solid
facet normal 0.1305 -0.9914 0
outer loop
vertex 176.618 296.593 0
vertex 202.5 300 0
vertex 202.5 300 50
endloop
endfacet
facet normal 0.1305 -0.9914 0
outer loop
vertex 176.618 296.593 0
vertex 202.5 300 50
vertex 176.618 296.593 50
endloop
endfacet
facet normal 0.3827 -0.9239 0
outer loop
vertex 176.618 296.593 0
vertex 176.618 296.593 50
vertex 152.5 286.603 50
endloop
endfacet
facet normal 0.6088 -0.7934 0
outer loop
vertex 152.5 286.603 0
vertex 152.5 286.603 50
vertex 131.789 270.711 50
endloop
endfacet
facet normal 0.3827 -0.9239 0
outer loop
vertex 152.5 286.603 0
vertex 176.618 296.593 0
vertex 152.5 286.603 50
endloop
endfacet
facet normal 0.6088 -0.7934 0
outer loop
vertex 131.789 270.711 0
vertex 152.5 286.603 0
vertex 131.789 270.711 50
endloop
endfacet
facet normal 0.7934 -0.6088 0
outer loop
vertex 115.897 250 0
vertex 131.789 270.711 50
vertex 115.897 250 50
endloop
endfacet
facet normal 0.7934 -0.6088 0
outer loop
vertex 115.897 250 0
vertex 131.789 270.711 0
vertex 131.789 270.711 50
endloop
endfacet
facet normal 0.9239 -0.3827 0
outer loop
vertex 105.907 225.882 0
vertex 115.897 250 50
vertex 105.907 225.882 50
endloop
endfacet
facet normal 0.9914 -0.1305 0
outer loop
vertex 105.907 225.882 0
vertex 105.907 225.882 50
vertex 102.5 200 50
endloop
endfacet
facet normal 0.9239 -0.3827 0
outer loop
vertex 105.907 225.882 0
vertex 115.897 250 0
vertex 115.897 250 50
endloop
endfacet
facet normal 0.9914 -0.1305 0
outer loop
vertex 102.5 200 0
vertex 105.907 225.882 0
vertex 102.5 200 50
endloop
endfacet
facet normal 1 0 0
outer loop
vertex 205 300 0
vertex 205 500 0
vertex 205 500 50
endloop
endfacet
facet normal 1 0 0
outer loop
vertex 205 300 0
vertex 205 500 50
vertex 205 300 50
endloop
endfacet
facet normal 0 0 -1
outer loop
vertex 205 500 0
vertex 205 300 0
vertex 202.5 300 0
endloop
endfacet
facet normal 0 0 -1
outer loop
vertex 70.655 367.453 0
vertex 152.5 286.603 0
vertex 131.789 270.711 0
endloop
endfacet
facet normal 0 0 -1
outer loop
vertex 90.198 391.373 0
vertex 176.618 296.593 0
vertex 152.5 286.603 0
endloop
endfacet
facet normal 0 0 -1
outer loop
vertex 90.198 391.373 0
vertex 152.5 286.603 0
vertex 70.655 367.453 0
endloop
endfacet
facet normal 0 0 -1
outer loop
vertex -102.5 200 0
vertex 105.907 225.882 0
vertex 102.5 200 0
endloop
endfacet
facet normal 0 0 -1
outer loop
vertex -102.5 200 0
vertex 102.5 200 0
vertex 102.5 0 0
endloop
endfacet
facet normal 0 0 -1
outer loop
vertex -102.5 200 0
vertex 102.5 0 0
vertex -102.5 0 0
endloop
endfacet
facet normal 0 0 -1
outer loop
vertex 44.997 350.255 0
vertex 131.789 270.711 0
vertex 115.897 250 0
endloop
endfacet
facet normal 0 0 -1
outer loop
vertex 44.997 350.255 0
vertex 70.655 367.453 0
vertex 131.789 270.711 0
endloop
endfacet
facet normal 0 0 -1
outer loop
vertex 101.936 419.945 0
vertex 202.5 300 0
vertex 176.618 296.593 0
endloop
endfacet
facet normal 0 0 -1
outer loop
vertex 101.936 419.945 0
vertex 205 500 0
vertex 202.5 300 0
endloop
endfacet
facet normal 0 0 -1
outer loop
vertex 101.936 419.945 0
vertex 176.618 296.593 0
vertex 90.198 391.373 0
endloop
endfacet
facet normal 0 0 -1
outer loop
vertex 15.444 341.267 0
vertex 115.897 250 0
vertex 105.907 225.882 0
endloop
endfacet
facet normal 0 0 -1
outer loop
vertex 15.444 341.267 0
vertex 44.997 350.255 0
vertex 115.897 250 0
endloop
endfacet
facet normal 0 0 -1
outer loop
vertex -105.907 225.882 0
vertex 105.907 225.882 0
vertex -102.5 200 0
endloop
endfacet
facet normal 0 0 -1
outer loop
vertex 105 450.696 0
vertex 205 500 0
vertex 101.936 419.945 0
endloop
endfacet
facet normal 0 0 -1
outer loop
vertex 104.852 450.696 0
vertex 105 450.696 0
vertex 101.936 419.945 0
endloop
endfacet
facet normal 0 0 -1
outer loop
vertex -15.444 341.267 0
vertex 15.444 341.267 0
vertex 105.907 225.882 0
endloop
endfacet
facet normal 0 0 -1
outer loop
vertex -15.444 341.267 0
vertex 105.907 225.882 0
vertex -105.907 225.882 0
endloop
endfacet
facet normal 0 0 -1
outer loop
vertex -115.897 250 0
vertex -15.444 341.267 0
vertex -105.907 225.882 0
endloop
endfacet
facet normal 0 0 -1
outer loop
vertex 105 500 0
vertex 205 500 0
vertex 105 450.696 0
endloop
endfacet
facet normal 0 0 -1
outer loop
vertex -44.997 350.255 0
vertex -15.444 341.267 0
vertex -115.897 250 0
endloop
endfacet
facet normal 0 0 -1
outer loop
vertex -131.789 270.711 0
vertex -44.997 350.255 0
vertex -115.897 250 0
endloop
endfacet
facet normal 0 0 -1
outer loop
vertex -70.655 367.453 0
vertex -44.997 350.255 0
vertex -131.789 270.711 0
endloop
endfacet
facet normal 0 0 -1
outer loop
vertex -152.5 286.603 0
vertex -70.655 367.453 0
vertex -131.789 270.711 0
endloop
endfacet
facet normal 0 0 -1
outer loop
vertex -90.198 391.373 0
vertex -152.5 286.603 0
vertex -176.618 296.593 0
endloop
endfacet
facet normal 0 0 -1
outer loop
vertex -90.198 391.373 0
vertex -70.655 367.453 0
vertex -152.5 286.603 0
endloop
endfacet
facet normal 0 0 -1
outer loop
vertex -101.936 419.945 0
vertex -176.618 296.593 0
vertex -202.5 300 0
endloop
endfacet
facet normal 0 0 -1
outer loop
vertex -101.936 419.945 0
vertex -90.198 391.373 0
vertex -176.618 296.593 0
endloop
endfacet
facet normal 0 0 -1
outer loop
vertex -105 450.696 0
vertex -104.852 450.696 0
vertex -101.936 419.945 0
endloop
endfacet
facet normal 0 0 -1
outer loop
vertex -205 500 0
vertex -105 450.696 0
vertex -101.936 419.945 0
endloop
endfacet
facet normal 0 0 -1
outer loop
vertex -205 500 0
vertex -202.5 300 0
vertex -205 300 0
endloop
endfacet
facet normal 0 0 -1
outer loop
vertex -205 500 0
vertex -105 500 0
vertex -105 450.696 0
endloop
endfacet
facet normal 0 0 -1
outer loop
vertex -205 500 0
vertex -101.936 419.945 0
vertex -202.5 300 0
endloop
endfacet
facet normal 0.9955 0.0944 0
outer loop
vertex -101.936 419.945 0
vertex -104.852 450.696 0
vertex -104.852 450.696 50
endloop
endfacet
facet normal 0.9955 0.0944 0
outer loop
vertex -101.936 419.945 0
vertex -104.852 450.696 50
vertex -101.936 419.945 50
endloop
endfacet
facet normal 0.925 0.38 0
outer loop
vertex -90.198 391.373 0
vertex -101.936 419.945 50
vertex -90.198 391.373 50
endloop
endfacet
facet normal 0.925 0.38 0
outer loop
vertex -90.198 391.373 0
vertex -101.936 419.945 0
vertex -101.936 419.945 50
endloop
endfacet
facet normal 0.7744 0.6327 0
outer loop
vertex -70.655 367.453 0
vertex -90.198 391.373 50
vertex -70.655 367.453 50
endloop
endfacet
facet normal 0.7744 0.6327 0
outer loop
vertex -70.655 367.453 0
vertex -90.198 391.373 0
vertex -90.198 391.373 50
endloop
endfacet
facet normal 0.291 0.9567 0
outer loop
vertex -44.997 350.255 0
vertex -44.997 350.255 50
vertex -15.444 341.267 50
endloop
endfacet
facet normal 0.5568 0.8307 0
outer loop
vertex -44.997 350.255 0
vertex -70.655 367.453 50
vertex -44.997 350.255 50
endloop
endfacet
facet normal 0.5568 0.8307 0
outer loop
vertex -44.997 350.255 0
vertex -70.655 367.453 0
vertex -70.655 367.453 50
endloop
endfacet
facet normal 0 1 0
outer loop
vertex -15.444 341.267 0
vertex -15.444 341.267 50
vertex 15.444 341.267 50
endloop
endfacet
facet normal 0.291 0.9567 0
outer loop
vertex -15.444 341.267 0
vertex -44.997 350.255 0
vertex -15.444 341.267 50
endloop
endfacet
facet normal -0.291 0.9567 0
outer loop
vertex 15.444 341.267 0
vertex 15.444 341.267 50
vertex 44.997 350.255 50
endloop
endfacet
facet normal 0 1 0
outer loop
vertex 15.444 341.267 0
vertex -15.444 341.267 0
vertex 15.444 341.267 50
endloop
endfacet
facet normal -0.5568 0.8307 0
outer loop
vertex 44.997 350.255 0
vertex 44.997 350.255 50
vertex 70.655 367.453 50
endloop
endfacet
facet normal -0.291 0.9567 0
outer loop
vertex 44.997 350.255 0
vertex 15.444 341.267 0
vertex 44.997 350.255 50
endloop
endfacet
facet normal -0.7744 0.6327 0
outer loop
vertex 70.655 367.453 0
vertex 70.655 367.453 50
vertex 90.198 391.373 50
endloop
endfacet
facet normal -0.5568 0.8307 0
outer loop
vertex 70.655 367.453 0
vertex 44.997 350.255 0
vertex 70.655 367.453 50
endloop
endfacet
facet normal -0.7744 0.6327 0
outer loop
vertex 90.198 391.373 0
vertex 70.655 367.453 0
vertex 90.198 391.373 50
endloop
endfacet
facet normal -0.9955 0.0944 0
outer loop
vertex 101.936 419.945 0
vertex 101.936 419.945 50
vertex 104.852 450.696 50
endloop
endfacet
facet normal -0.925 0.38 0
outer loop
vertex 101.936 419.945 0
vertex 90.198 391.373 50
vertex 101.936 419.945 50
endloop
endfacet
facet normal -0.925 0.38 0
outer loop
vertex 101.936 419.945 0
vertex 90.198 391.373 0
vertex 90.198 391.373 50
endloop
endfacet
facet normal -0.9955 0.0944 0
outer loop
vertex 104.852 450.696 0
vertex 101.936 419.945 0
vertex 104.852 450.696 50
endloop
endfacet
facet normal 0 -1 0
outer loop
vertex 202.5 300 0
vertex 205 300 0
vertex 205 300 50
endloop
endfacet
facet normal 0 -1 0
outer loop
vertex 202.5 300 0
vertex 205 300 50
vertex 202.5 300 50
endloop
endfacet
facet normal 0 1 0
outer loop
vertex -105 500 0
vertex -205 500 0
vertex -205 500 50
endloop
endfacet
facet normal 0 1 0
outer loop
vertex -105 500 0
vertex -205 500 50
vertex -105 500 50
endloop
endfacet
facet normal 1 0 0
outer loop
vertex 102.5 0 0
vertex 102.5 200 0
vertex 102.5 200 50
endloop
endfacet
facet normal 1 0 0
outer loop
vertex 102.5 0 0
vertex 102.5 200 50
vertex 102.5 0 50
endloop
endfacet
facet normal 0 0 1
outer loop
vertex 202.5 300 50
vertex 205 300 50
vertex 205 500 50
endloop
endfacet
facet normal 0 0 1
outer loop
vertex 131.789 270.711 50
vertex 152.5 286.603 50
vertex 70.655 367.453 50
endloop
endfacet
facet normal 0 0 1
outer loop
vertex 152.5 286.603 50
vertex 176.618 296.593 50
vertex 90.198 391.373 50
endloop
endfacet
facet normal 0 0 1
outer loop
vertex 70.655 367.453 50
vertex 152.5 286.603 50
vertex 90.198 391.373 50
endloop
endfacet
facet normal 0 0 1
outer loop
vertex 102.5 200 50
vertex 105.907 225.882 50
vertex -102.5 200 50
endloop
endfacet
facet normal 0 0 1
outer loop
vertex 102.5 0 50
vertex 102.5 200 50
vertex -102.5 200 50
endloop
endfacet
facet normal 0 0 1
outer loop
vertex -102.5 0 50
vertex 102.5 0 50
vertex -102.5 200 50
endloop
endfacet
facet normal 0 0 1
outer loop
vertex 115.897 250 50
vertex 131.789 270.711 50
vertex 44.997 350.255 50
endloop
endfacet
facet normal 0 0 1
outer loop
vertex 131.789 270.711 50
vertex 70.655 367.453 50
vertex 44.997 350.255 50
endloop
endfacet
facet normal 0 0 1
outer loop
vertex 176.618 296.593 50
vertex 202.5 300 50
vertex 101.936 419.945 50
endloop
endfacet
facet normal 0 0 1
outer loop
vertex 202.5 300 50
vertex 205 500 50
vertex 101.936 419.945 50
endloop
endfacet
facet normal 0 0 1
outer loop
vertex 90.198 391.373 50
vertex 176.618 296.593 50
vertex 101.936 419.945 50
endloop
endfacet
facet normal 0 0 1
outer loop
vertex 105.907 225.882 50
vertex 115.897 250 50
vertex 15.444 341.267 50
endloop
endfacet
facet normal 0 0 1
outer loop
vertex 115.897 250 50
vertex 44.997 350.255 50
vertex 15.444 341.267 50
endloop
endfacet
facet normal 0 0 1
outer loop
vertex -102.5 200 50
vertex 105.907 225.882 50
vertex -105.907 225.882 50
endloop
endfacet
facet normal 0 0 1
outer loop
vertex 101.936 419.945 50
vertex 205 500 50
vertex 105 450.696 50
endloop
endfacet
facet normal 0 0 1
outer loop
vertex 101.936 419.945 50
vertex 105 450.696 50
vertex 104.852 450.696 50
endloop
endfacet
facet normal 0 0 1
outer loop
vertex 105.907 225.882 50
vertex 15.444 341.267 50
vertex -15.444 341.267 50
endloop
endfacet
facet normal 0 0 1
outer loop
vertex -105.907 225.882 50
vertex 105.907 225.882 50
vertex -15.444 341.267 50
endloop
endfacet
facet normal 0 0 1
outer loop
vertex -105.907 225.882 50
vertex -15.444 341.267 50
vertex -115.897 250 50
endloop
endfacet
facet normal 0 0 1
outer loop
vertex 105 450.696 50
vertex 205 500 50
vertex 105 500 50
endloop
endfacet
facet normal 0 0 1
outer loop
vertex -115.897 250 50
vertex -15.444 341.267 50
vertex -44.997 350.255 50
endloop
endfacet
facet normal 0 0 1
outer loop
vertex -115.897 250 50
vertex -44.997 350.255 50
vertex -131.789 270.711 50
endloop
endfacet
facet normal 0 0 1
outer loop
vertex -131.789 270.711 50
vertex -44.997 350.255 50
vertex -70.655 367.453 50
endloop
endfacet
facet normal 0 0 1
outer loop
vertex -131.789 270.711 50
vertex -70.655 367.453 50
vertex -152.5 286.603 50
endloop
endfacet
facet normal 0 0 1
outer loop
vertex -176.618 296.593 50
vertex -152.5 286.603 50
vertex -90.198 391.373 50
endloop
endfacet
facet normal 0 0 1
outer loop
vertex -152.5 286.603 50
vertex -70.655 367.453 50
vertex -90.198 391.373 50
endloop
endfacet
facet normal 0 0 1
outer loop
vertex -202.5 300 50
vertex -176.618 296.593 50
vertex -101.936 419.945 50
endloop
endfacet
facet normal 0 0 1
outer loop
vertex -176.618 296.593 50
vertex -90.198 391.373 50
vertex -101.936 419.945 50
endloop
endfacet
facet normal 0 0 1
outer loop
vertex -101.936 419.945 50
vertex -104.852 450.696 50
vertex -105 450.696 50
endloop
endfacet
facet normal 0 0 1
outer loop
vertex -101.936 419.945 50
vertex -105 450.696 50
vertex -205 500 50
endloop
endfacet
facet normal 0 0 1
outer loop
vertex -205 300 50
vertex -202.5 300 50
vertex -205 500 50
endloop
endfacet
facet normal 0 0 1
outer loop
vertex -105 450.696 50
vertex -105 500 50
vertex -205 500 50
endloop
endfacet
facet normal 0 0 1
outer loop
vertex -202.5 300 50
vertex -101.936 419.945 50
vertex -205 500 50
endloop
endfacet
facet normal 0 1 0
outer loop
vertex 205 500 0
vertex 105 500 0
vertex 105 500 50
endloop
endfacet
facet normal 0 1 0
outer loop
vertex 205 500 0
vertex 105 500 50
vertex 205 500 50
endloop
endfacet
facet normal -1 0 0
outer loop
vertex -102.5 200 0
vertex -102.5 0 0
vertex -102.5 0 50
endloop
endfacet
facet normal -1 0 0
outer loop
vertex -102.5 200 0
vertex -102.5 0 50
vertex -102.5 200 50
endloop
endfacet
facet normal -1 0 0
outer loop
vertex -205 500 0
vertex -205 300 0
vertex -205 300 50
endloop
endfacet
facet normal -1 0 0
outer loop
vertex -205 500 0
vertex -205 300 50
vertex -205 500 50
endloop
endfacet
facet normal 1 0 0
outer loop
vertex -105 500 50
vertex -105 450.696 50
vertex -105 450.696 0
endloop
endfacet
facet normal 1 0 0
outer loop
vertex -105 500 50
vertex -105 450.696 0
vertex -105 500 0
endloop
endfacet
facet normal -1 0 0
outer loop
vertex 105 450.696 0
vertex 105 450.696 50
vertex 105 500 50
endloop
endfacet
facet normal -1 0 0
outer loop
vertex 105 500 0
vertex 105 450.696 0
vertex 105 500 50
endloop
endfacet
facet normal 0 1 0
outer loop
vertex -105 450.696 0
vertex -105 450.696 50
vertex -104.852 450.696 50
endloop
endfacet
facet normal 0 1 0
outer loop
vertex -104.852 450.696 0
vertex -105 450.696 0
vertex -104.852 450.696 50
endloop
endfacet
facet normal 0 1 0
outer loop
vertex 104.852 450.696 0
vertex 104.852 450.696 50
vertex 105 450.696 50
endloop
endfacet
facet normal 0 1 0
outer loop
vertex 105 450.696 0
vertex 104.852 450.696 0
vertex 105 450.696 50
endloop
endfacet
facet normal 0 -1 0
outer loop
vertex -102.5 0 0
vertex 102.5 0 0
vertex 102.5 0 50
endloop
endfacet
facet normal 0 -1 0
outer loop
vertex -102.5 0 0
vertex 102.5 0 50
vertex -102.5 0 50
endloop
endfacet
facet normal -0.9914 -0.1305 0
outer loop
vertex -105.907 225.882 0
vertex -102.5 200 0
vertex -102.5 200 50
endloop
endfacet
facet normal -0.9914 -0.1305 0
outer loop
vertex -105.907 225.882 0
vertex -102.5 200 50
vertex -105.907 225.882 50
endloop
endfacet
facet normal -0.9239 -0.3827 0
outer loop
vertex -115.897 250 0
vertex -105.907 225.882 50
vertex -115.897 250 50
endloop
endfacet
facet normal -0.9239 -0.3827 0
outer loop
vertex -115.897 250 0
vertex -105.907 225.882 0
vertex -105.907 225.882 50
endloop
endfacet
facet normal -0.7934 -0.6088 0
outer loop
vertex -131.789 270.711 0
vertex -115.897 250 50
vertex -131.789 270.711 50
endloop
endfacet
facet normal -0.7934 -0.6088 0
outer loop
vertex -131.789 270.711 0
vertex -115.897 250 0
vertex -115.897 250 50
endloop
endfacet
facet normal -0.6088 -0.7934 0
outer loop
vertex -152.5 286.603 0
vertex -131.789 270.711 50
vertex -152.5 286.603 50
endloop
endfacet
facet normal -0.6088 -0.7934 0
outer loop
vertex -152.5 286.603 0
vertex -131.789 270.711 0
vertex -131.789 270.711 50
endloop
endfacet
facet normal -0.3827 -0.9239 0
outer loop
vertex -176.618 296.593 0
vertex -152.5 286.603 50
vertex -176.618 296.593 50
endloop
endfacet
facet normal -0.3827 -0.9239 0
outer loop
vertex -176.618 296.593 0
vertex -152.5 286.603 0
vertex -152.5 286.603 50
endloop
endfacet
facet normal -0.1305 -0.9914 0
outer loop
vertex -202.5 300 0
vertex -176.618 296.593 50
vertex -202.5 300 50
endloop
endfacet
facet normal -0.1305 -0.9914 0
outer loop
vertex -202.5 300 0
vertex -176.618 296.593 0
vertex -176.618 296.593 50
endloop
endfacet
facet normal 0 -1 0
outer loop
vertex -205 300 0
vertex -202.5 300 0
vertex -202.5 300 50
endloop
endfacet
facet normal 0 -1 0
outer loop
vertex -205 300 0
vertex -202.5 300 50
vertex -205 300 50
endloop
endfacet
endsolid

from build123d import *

# Parameters (mm, degrees)
BOSS_EXTRUDE2_DEPTH = 50
CUT_EXTRUDE2_START  = -102.5
SKETCH2_R           = 3.05
CUT_EXTRUDE2_DEPTH  = 6
CUT_EXTRUDE3_START  = 96.5
SKETCH2_2_R         = 3.05
CUT_EXTRUDE3_DEPTH  = 6
BOSS_EXTRUDE3_DEPTH = 50
SKETCH5_R           = 105
CUT_EXTRUDE6_DEPTH  = 543.701575454
SKETCH8_W           = 210
SKETCH8_H           = 49.303912119
CUT_EXTRUDE7_DEPTH  = 543.701575454


with BuildPart() as part:
    # Sketch1 → Boss-Extrude2 (new body)
    with BuildSketch(Plane.XY):
        with BuildLine():
            Line((102.5, 0), (-102.5, 0))
            Line((-102.5, 0), (-102.5, 200))
            ThreePointArc((-102.5, 200), (-131.789321881, 270.710678119), (-202.5, 300))
            Line((-202.5, 300), (-205, 300))
            Line((-205, 300), (-205, 490))
            ThreePointArc((-205, 490), (-202.071067812, 497.071067812), (-195, 500))
            Line((-195, 500), (-112.5, 500))
            ThreePointArc((-112.5, 500), (-105.428932188, 497.071067812), (-102.5, 490))
            Line((-102.5, 490), (-102.5, 400.25))
            ThreePointArc((-102.5, 400.25), (-102.426776695, 400.073223305), (-102.25, 400))
            Line((-102.25, 400), (102.25, 400))
            ThreePointArc((102.25, 400), (102.426776695, 400.073223305), (102.5, 400.25))
            Line((102.5, 400.25), (102.5, 490))
            ThreePointArc((102.5, 490), (105.428932188, 497.071067812), (112.5, 500))
            Line((112.5, 500), (195, 500))
            ThreePointArc((195, 500), (202.071067812, 497.071067812), (205, 490))
            Line((205, 490), (205, 300))
            Line((205, 300), (202.5, 300))
            ThreePointArc((202.5, 300), (131.789321881, 270.710678119), (102.5, 200))
            Line((102.5, 200), (102.5, 0))
        make_face()
    extrude(amount=BOSS_EXTRUDE2_DEPTH)

    # Sketch2 → Cut-Extrude2 (cut)
    with BuildSketch(Plane(origin=(0, 0, 0), x_dir=(0, 0, -1), z_dir=(1, 0, 0)).offset(CUT_EXTRUDE2_START)):
        with Locations(Location((-25, 30, 0), (0, 0, 180))):
            Circle(SKETCH2_R)
        with Locations(Location((-25, 90, 0), (0, 0, 180))):
            Circle(SKETCH2_R)
        with Locations(Location((-25, 150, 0), (0, 0, 180))):
            Circle(SKETCH2_R)
    extrude(amount=CUT_EXTRUDE2_DEPTH, mode=Mode.SUBTRACT)

    # Sketch2<2> → Cut-Extrude3 (cut)
    with BuildSketch(Plane(origin=(0, 0, 0), x_dir=(0, 0, -1), z_dir=(1, 0, 0)).offset(CUT_EXTRUDE3_START)):
        with Locations(Location((-25, 30, 0), (0, 0, 180))):
            Circle(SKETCH2_2_R)
        with Locations(Location((-25, 90, 0), (0, 0, 180))):
            Circle(SKETCH2_2_R)
        with Locations(Location((-25, 150, 0), (0, 0, 180))):
            Circle(SKETCH2_2_R)
    extrude(amount=CUT_EXTRUDE3_DEPTH, mode=Mode.SUBTRACT)

    # Sketch6 → Boss-Extrude3 (add)
    with BuildSketch(Plane.XY):
        with BuildLine():
            Line((202.5, 300), (205, 300))
            Line((205, 300), (205, 500))
            Line((205, 500), (-205, 500))
            Line((-205, 500), (-205, 300))
            Line((-205, 300), (-202.5, 300))
            ThreePointArc((-202.5, 300), (-131.789321881, 270.710678119), (-102.5, 200))
            Line((-102.5, 200), (-102.5, 0))
            Line((-102.5, 0), (102.5, 0))
            Line((102.5, 0), (102.5, 200))
            ThreePointArc((102.5, 200), (131.789321881, 270.710678119), (202.5, 300))
        make_face()
    extrude(amount=BOSS_EXTRUDE3_DEPTH)

    # Sketch5 → Cut-Extrude6 (cut, through all)
    with BuildSketch(Plane.XY):
        with Locations((0, 445.125)):
            Circle(SKETCH5_R)
    extrude(amount=CUT_EXTRUDE6_DEPTH, mode=Mode.SUBTRACT)

    # Sketch8 → Cut-Extrude7 (cut, through all)
    with BuildSketch(Plane.XY):
        with Locations((0, 475.348043941)):
            Rectangle(SKETCH8_W, SKETCH8_H)
    extrude(amount=CUT_EXTRUDE7_DEPTH, mode=Mode.SUBTRACT)


solid = part.part
